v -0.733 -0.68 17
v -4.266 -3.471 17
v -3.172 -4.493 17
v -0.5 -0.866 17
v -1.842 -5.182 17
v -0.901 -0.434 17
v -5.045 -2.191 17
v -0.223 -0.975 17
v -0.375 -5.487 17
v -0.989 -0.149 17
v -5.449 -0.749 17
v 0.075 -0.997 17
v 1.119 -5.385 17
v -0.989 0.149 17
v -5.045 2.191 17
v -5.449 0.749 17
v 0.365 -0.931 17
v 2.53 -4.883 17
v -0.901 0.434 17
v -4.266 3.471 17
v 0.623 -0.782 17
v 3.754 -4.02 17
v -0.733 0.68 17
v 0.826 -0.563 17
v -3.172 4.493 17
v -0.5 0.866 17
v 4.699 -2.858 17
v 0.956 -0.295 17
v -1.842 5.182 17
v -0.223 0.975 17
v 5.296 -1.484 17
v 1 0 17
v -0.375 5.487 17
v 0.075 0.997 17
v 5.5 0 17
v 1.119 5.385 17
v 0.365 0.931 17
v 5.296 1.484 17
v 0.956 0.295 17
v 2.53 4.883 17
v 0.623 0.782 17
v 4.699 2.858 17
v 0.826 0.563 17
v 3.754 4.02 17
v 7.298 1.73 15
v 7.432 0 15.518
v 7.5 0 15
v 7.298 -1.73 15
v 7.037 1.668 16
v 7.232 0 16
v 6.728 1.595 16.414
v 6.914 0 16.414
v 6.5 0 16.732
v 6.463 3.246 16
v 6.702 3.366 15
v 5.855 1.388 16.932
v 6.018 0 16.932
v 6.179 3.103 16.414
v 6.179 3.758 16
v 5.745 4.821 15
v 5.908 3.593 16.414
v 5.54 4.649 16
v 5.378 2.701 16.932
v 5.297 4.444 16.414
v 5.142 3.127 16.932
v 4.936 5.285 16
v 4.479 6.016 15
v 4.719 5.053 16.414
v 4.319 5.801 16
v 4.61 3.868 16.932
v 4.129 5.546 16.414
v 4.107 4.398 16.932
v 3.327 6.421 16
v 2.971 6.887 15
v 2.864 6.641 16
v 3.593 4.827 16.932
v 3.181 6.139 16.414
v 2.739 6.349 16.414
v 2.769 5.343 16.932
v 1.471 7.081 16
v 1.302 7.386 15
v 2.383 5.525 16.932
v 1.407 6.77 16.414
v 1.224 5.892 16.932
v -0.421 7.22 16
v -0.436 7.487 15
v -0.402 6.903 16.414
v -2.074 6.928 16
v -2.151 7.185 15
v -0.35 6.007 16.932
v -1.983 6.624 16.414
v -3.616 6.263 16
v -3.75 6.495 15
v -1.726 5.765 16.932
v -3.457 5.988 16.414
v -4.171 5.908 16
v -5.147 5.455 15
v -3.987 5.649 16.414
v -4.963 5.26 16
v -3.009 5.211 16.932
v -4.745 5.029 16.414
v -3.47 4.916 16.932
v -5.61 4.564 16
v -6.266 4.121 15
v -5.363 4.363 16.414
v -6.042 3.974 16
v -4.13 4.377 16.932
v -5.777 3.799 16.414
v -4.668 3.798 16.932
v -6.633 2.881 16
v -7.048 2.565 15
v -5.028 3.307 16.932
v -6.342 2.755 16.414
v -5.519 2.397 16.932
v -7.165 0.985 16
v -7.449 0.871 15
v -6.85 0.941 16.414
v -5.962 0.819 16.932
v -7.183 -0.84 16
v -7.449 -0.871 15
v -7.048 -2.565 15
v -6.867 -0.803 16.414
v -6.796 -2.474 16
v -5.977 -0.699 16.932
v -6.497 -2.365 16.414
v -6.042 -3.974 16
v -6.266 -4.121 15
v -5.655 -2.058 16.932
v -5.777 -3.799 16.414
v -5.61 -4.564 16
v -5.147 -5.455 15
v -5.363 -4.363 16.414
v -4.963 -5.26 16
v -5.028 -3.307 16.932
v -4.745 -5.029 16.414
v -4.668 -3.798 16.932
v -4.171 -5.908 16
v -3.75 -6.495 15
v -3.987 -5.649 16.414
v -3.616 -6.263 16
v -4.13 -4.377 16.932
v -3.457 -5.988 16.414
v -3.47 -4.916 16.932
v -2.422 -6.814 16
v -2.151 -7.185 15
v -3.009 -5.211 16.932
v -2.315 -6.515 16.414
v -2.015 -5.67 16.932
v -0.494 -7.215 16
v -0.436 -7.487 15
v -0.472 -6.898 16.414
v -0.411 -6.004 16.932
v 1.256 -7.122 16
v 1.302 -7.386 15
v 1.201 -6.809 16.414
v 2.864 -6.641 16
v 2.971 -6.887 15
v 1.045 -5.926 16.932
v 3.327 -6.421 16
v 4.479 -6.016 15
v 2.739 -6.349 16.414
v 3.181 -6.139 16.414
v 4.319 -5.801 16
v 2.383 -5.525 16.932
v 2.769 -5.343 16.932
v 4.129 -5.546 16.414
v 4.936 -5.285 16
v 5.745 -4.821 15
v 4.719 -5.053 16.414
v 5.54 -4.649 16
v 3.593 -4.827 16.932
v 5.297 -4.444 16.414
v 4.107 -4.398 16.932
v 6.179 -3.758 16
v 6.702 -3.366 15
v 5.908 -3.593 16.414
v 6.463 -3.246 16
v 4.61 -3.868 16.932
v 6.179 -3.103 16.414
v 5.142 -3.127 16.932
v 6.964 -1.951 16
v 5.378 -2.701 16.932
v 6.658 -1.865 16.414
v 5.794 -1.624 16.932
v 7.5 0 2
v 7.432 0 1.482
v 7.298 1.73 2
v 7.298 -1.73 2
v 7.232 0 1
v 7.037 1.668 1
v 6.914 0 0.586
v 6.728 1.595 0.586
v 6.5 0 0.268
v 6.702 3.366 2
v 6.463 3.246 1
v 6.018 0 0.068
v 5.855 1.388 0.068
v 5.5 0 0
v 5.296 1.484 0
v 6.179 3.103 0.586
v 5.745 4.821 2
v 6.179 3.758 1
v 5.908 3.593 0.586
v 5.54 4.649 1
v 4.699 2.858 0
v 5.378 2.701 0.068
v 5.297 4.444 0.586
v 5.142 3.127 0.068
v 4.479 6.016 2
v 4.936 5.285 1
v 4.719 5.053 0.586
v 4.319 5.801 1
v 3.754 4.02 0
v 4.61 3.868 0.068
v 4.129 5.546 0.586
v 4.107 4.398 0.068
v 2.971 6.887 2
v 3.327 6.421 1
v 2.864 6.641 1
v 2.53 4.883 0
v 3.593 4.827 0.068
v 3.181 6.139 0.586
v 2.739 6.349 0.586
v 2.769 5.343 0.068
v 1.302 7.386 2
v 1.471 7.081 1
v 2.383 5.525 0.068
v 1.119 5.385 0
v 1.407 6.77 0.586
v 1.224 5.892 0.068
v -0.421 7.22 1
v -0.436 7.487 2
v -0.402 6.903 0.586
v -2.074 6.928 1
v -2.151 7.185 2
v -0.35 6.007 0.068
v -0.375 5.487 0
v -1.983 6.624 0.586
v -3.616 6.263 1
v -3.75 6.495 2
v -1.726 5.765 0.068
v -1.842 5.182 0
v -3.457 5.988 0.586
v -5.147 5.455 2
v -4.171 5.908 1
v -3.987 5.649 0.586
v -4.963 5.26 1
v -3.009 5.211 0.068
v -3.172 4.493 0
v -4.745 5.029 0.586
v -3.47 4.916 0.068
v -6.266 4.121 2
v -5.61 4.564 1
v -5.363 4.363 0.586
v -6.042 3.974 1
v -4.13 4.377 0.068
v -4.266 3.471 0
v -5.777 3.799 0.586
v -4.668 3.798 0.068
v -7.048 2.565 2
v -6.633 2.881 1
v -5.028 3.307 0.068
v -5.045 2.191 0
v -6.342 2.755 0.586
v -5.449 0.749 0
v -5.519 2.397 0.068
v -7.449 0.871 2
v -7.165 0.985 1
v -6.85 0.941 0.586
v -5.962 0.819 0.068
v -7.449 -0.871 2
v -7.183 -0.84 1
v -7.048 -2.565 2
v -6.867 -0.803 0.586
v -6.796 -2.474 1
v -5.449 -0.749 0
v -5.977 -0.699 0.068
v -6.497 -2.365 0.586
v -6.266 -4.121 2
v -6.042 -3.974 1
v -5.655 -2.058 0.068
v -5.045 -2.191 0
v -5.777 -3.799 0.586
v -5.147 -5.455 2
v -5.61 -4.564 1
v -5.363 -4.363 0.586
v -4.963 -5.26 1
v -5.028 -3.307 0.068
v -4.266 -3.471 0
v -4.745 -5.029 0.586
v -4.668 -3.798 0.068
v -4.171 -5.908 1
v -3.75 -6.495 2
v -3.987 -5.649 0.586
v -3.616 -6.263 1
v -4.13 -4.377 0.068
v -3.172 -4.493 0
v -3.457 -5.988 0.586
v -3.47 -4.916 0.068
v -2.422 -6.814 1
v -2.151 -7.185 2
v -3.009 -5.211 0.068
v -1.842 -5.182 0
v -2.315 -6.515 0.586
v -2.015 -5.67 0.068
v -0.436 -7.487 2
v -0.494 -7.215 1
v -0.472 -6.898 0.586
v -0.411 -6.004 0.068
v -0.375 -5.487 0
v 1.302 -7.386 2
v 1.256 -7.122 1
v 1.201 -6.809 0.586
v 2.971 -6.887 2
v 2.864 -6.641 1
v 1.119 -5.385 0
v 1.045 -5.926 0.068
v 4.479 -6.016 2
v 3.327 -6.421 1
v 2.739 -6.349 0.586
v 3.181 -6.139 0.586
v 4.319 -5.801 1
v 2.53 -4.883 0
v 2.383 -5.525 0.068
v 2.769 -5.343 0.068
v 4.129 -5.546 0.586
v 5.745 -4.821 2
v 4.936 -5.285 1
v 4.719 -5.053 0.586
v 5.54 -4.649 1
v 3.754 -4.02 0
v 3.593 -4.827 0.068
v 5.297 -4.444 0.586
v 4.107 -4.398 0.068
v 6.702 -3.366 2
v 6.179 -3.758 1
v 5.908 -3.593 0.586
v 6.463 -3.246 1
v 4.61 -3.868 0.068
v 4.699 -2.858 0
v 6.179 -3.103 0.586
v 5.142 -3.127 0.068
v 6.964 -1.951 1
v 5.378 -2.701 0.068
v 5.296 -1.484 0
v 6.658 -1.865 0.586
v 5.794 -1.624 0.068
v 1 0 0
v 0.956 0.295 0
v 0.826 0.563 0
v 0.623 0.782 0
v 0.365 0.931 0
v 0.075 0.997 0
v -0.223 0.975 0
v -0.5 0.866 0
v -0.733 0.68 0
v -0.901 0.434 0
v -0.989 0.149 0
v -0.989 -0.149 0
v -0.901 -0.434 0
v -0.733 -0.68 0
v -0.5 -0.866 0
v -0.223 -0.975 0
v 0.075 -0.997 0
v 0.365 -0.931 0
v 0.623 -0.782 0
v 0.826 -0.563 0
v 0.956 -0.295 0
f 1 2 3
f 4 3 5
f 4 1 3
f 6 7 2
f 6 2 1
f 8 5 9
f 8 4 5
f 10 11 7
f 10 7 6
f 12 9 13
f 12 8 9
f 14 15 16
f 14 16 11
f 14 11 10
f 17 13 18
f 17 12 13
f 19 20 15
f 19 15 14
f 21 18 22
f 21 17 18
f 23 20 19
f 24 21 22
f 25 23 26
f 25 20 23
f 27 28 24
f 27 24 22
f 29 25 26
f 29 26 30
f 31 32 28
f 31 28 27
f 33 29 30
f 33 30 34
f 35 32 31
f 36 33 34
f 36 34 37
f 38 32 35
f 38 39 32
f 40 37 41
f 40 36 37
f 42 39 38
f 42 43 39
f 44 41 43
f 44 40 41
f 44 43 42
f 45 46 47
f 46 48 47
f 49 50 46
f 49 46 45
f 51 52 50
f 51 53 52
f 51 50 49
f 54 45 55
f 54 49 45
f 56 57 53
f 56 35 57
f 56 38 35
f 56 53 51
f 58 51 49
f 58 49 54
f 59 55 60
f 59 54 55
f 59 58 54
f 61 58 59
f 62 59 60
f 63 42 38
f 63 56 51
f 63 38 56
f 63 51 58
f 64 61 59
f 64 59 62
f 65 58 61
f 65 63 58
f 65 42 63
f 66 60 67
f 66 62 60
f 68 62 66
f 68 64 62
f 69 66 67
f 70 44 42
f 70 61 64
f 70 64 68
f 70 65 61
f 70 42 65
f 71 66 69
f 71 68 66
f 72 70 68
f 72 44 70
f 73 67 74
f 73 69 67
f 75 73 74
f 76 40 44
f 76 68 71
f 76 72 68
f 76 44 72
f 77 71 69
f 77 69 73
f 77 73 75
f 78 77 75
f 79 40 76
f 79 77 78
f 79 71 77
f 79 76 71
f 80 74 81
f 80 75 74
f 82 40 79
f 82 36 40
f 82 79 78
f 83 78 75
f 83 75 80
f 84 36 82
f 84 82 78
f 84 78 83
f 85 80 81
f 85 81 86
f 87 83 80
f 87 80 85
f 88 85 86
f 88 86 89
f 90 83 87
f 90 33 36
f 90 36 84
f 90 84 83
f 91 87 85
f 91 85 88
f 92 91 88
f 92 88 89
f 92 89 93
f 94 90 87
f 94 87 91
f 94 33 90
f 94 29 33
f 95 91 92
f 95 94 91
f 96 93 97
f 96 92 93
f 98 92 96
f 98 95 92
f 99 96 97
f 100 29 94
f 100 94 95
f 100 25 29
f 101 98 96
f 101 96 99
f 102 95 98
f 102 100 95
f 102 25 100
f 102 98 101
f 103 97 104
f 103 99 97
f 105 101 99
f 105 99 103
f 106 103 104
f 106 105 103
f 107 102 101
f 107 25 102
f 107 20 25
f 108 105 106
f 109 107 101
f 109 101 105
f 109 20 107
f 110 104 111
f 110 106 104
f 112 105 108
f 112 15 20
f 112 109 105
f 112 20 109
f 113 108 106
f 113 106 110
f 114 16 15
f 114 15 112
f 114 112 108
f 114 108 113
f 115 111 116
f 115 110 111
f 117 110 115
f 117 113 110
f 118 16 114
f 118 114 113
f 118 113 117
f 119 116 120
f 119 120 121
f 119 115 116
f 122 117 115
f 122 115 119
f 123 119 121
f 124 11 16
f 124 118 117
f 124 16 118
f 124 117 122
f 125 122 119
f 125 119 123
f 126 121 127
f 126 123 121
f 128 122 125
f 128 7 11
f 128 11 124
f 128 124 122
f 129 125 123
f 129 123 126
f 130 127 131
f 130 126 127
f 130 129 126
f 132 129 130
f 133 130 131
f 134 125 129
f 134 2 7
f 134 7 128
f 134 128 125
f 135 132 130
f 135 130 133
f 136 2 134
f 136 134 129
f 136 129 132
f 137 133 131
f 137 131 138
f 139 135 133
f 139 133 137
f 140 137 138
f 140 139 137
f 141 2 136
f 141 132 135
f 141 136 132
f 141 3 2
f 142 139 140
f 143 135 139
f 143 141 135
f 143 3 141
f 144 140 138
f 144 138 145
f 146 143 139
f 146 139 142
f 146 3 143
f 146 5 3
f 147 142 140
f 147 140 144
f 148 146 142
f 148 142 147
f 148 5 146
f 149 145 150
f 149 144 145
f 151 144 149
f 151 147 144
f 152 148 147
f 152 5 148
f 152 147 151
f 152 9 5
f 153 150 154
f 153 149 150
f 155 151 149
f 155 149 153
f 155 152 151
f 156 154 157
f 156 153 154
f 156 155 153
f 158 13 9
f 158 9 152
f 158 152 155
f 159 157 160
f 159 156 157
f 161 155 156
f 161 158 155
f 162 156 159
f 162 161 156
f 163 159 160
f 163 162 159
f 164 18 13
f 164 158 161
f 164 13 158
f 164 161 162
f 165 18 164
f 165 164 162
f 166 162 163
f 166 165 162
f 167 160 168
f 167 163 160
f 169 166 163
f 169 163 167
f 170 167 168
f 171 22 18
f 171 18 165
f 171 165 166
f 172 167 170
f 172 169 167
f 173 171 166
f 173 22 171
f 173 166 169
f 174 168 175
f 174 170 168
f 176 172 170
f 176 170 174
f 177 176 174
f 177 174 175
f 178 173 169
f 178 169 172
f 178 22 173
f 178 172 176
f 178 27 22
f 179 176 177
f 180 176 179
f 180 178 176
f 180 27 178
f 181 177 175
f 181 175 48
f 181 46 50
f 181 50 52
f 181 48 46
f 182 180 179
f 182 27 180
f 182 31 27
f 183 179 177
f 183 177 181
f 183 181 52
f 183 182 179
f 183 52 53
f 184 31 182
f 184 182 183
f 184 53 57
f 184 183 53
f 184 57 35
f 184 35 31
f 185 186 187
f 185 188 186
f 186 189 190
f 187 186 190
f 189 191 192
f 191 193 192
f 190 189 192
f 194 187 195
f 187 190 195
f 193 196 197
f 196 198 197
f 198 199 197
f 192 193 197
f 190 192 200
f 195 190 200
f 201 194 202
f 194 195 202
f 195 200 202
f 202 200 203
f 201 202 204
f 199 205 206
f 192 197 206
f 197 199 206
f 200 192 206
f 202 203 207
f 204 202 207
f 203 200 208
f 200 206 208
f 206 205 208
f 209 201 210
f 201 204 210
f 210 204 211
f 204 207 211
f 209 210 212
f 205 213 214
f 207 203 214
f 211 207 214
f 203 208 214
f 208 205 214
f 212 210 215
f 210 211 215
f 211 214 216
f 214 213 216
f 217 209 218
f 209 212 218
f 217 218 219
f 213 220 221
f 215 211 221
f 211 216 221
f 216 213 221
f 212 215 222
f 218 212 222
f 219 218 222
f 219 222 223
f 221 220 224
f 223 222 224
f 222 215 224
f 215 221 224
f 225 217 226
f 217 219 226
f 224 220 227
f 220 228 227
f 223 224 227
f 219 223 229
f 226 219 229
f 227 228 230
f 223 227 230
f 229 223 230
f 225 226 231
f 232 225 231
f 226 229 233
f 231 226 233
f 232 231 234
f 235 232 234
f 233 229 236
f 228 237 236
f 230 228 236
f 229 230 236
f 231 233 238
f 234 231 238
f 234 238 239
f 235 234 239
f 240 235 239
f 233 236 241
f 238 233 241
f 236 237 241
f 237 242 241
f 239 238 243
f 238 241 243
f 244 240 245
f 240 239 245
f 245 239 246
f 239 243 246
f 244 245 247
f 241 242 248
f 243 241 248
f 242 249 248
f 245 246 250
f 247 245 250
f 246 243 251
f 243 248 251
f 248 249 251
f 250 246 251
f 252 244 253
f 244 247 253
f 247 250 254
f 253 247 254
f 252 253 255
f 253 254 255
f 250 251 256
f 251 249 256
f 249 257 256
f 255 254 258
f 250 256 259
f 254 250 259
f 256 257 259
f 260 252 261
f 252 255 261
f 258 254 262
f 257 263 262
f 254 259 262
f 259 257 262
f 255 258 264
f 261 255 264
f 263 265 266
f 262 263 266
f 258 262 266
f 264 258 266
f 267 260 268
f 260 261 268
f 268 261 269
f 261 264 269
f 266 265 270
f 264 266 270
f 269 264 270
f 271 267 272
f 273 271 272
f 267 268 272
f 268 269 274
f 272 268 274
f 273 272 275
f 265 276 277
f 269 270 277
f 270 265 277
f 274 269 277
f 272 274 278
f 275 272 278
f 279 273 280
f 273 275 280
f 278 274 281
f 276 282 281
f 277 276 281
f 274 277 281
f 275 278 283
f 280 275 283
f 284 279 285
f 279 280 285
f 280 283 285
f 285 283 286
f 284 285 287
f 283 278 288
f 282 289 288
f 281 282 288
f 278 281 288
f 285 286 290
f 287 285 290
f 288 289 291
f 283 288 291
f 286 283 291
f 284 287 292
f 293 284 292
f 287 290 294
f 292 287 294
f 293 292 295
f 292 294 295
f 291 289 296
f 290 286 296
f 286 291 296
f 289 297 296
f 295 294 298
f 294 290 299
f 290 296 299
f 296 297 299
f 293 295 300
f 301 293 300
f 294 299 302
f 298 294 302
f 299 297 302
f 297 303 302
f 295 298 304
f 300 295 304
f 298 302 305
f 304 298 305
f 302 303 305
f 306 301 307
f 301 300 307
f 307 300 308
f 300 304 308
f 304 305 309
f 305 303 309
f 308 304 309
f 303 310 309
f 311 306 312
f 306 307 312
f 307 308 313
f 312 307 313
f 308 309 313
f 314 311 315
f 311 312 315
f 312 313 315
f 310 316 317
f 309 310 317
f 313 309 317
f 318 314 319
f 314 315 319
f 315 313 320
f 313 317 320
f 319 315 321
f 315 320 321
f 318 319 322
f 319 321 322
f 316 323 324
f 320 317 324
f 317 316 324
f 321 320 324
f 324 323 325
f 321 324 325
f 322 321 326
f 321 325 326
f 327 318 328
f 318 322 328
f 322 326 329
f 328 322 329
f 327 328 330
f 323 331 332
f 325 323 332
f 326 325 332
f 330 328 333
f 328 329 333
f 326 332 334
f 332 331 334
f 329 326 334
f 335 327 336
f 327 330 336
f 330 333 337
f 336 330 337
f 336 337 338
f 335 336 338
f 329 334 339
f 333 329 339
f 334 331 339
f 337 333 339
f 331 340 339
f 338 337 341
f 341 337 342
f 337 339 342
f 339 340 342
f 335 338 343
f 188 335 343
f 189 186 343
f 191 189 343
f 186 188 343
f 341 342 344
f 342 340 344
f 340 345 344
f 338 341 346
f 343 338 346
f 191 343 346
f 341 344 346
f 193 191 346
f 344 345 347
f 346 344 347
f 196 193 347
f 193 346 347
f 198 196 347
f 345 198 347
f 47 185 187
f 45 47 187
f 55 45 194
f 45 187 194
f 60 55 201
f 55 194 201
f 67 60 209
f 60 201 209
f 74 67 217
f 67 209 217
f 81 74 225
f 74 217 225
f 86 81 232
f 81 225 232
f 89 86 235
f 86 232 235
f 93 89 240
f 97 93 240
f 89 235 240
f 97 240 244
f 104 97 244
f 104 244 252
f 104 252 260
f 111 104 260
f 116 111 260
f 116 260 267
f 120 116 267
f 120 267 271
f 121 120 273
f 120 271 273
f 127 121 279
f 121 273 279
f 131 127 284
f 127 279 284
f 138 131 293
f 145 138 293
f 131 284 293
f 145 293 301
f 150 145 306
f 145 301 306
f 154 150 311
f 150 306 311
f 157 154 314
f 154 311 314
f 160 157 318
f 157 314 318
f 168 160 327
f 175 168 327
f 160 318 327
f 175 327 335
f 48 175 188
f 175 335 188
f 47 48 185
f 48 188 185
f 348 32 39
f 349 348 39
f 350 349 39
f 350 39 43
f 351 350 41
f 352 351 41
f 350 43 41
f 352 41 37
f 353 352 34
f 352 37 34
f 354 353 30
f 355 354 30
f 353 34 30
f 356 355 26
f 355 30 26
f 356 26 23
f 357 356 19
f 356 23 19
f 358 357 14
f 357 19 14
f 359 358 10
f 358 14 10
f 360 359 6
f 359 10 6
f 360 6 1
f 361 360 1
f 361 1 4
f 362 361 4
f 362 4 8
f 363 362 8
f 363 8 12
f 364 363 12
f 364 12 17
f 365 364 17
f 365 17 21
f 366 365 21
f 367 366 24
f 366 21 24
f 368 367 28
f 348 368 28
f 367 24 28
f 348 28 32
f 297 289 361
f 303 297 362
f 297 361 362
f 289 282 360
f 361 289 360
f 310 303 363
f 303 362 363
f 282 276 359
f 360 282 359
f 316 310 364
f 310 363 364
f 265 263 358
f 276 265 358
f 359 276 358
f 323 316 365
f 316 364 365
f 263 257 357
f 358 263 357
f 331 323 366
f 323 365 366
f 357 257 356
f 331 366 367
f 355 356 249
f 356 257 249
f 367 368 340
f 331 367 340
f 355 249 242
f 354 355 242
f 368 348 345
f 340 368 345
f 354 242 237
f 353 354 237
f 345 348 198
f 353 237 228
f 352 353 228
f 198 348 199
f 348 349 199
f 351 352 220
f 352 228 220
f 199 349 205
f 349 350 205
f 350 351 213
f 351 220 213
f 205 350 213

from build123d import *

# Parameters (mm, degrees)
SKETCH3_R           = 7.5
BOSS_EXTRUDE2_DEPTH = 17
SKETCH5_R           = 1
CUT_EXTRUDE1_DEPTH  = 17
FILLET5_R           = 2
FILLET6_R           = 2


with BuildPart() as part:
    # Sketch3 → Boss-Extrude2 (new body)
    with BuildSketch(Plane.XY):
        Circle(SKETCH3_R)
    extrude(amount=BOSS_EXTRUDE2_DEPTH)

    # Sketch5 → Cut-Extrude1 (cut)
    with BuildSketch(Plane.XY.offset(17)):
        Circle(SKETCH5_R)
    extrude(amount=-CUT_EXTRUDE1_DEPTH, mode=Mode.SUBTRACT)

    # Fillet5
    fillet5_edges = [part.edges().sort_by_distance(p)[0] for p in [
        (-7.5, 0, 17),
    ]]
    fillet(fillet5_edges, radius=FILLET5_R)

    # Fillet6
    fillet6_edges = [part.edges().sort_by_distance(p)[0] for p in [
        (-7.5, 0, 0),
    ]]
    fillet(fillet6_edges, radius=FILLET6_R)


solid = part.part
